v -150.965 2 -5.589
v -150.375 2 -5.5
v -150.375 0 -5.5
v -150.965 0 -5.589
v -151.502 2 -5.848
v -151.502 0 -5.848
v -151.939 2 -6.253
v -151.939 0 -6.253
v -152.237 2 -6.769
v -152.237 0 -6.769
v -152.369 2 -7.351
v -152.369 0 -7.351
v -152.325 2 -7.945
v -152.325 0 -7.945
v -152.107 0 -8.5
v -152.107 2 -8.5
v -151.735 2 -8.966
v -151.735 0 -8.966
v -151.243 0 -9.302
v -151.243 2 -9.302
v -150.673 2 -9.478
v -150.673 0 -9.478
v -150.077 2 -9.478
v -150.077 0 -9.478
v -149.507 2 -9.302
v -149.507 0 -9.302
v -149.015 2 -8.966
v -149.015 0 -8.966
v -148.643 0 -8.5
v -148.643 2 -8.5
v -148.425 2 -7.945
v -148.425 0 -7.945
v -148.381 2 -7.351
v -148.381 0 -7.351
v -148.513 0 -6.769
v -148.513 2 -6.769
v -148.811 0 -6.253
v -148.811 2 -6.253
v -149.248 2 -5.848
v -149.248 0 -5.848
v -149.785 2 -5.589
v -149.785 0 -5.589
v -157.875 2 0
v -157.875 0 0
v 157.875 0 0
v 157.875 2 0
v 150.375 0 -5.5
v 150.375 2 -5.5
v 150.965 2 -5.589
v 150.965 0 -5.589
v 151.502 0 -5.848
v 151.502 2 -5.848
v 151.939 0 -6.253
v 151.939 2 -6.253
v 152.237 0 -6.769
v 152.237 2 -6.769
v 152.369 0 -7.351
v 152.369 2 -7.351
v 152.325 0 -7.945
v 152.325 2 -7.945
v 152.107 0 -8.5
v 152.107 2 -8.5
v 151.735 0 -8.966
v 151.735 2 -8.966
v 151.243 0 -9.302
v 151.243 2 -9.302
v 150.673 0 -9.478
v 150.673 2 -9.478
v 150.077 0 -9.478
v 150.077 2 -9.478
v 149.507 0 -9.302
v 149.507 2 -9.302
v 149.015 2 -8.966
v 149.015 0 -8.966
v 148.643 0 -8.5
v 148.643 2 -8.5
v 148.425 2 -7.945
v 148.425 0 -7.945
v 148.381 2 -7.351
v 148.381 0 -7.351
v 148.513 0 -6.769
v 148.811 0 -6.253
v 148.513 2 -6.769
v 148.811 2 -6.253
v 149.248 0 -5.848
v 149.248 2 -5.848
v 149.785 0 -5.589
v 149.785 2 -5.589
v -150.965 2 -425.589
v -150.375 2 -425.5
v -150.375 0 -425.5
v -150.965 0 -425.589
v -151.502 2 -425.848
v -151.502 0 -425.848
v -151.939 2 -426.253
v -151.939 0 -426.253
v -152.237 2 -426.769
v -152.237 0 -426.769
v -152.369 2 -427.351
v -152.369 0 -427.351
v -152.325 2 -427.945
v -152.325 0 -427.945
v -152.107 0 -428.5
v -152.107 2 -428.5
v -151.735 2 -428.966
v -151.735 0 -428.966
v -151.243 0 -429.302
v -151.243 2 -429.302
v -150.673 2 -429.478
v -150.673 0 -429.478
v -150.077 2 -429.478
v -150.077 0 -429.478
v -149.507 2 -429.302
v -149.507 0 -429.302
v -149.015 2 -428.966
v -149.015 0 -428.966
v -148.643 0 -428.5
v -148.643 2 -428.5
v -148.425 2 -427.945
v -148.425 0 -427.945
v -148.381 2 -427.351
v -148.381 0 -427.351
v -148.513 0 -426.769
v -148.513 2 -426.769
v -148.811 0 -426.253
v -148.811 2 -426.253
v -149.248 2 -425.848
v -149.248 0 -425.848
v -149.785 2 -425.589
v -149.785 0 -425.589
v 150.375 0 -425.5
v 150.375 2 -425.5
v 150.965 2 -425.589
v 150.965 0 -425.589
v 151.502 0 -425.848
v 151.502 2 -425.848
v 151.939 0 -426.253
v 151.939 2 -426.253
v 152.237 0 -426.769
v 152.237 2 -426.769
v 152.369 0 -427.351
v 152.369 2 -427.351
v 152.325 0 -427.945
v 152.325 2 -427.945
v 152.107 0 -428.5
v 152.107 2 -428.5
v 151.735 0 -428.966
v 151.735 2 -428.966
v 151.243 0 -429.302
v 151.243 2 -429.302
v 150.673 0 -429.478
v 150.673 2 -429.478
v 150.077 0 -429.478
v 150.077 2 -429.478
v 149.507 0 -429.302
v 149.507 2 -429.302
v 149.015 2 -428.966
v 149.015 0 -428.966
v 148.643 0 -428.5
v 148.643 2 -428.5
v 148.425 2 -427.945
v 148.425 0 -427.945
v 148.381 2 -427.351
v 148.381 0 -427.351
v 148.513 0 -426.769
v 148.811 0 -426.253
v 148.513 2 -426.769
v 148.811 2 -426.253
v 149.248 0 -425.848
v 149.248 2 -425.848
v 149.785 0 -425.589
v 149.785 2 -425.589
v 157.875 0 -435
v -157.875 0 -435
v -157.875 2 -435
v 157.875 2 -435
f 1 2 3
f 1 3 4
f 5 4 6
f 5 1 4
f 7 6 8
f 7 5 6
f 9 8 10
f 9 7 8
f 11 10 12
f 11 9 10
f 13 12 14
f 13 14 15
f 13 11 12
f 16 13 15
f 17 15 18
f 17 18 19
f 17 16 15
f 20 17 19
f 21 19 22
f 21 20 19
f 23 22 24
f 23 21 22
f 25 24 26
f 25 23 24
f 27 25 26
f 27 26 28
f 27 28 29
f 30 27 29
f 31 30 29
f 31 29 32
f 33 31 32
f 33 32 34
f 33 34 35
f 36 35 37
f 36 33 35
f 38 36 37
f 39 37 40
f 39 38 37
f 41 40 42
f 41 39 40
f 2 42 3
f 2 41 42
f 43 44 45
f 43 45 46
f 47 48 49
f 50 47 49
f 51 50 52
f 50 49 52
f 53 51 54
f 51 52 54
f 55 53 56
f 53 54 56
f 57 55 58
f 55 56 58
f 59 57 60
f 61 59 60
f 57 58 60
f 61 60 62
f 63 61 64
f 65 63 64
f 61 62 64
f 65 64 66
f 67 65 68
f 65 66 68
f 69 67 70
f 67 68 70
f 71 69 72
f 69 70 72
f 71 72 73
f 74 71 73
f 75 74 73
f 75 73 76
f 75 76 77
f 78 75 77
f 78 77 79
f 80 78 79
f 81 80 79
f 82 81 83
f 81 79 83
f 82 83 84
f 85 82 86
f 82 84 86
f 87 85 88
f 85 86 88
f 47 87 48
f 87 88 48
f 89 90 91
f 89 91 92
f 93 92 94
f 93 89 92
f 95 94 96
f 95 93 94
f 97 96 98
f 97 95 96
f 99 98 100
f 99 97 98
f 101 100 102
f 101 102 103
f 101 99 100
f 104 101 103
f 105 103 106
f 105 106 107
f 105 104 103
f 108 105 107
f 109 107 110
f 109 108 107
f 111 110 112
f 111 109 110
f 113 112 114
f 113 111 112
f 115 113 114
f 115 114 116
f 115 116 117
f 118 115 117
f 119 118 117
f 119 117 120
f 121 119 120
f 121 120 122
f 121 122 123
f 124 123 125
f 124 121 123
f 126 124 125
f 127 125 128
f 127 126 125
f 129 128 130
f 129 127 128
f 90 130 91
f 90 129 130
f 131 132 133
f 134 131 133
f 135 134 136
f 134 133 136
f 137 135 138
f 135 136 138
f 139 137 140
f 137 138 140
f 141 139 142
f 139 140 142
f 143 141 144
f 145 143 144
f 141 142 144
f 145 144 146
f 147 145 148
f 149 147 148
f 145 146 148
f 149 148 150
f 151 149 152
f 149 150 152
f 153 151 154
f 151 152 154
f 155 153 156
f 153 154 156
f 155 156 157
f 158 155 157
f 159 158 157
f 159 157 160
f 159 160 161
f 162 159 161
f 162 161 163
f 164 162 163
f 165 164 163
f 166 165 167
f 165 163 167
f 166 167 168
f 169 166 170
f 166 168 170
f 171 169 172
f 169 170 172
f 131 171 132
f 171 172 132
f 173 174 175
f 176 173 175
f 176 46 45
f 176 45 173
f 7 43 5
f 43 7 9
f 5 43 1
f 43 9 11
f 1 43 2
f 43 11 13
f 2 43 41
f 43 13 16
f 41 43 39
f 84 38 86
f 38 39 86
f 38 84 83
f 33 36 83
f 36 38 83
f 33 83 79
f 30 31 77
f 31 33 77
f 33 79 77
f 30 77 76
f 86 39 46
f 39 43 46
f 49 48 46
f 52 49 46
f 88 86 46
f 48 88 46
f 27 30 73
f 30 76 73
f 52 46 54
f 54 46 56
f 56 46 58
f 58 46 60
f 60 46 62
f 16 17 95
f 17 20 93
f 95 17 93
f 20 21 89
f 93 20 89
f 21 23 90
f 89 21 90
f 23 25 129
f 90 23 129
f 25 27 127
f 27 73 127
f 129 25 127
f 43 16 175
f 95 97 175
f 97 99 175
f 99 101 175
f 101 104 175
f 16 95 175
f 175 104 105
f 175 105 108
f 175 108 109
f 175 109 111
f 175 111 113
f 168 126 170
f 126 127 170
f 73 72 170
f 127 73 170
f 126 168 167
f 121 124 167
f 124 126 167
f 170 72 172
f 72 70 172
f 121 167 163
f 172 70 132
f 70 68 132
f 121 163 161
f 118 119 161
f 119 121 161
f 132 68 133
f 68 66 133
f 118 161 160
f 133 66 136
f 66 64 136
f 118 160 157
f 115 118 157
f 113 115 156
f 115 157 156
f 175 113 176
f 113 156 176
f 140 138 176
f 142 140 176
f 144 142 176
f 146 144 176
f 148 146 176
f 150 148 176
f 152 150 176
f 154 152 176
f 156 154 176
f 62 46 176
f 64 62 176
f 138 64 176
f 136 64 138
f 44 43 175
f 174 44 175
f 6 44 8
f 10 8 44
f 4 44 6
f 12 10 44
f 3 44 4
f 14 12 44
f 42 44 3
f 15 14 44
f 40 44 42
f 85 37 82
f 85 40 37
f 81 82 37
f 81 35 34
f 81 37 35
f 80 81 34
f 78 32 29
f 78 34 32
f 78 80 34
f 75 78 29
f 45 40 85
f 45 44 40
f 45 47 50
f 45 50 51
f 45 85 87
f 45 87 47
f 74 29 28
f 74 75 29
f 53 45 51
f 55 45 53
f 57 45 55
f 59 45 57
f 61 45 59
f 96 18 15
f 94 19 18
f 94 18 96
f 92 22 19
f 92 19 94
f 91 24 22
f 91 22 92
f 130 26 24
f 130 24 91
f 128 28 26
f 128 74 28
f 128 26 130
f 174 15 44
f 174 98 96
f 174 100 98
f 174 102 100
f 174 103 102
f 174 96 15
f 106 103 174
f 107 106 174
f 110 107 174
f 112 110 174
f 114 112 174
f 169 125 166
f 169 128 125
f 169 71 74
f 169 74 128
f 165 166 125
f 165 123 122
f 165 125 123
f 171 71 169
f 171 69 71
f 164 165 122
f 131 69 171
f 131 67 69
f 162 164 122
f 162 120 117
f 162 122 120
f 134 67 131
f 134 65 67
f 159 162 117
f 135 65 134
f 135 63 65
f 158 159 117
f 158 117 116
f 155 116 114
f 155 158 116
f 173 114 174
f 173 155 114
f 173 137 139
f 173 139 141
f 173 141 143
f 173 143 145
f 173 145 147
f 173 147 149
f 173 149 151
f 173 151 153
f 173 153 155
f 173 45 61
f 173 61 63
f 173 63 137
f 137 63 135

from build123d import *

# Parameters (mm, degrees)
SKETCH1_W           = 435
SKETCH1_H           = 2
BOSS_EXTRUDE1_DEPTH = 157.875
SKETCH3_R           = 2
CUT_EXTRUDE1_DEPTH  = 2


with BuildPart() as part:
    # Sketch1 → Boss-Extrude1 (new body)
    with BuildSketch(Plane(origin=(0, 0, 0), x_dir=(0, 0, -1), z_dir=(1, 0, 0))):
        with Locations((217.5, 1)):
            Rectangle(SKETCH1_W, SKETCH1_H)
    boss_extrude1 = extrude(amount=BOSS_EXTRUDE1_DEPTH)

    # Sketch3 → Cut-Extrude1 (cut)
    with BuildSketch(Plane(origin=(0, 2, 0), x_dir=(1, 0, 0), z_dir=(0, 1, 0))):
        with Locations(Location((150.375, 427.5, 0), (0, 0, 270))):
            Circle(SKETCH3_R)
        with Locations(Location((150.375, 7.5, 0), (0, 0, 270))):
            Circle(SKETCH3_R)
    cut_extrude1 = extrude(amount=-CUT_EXTRUDE1_DEPTH, mode=Mode.SUBTRACT)

    # Mirror1: Boss-Extrude1, Cut-Extrude1 across plane
    add(boss_extrude1.mirror(Plane(origin=(0, 0, 0), x_dir=(0, 0, 1), z_dir=(1, 0, 0))))
    add(cut_extrude1.mirror(Plane(origin=(0, 0, 0), x_dir=(0, 0, 1), z_dir=(1, 0, 0))), mode=Mode.SUBTRACT)


solid = part.part
